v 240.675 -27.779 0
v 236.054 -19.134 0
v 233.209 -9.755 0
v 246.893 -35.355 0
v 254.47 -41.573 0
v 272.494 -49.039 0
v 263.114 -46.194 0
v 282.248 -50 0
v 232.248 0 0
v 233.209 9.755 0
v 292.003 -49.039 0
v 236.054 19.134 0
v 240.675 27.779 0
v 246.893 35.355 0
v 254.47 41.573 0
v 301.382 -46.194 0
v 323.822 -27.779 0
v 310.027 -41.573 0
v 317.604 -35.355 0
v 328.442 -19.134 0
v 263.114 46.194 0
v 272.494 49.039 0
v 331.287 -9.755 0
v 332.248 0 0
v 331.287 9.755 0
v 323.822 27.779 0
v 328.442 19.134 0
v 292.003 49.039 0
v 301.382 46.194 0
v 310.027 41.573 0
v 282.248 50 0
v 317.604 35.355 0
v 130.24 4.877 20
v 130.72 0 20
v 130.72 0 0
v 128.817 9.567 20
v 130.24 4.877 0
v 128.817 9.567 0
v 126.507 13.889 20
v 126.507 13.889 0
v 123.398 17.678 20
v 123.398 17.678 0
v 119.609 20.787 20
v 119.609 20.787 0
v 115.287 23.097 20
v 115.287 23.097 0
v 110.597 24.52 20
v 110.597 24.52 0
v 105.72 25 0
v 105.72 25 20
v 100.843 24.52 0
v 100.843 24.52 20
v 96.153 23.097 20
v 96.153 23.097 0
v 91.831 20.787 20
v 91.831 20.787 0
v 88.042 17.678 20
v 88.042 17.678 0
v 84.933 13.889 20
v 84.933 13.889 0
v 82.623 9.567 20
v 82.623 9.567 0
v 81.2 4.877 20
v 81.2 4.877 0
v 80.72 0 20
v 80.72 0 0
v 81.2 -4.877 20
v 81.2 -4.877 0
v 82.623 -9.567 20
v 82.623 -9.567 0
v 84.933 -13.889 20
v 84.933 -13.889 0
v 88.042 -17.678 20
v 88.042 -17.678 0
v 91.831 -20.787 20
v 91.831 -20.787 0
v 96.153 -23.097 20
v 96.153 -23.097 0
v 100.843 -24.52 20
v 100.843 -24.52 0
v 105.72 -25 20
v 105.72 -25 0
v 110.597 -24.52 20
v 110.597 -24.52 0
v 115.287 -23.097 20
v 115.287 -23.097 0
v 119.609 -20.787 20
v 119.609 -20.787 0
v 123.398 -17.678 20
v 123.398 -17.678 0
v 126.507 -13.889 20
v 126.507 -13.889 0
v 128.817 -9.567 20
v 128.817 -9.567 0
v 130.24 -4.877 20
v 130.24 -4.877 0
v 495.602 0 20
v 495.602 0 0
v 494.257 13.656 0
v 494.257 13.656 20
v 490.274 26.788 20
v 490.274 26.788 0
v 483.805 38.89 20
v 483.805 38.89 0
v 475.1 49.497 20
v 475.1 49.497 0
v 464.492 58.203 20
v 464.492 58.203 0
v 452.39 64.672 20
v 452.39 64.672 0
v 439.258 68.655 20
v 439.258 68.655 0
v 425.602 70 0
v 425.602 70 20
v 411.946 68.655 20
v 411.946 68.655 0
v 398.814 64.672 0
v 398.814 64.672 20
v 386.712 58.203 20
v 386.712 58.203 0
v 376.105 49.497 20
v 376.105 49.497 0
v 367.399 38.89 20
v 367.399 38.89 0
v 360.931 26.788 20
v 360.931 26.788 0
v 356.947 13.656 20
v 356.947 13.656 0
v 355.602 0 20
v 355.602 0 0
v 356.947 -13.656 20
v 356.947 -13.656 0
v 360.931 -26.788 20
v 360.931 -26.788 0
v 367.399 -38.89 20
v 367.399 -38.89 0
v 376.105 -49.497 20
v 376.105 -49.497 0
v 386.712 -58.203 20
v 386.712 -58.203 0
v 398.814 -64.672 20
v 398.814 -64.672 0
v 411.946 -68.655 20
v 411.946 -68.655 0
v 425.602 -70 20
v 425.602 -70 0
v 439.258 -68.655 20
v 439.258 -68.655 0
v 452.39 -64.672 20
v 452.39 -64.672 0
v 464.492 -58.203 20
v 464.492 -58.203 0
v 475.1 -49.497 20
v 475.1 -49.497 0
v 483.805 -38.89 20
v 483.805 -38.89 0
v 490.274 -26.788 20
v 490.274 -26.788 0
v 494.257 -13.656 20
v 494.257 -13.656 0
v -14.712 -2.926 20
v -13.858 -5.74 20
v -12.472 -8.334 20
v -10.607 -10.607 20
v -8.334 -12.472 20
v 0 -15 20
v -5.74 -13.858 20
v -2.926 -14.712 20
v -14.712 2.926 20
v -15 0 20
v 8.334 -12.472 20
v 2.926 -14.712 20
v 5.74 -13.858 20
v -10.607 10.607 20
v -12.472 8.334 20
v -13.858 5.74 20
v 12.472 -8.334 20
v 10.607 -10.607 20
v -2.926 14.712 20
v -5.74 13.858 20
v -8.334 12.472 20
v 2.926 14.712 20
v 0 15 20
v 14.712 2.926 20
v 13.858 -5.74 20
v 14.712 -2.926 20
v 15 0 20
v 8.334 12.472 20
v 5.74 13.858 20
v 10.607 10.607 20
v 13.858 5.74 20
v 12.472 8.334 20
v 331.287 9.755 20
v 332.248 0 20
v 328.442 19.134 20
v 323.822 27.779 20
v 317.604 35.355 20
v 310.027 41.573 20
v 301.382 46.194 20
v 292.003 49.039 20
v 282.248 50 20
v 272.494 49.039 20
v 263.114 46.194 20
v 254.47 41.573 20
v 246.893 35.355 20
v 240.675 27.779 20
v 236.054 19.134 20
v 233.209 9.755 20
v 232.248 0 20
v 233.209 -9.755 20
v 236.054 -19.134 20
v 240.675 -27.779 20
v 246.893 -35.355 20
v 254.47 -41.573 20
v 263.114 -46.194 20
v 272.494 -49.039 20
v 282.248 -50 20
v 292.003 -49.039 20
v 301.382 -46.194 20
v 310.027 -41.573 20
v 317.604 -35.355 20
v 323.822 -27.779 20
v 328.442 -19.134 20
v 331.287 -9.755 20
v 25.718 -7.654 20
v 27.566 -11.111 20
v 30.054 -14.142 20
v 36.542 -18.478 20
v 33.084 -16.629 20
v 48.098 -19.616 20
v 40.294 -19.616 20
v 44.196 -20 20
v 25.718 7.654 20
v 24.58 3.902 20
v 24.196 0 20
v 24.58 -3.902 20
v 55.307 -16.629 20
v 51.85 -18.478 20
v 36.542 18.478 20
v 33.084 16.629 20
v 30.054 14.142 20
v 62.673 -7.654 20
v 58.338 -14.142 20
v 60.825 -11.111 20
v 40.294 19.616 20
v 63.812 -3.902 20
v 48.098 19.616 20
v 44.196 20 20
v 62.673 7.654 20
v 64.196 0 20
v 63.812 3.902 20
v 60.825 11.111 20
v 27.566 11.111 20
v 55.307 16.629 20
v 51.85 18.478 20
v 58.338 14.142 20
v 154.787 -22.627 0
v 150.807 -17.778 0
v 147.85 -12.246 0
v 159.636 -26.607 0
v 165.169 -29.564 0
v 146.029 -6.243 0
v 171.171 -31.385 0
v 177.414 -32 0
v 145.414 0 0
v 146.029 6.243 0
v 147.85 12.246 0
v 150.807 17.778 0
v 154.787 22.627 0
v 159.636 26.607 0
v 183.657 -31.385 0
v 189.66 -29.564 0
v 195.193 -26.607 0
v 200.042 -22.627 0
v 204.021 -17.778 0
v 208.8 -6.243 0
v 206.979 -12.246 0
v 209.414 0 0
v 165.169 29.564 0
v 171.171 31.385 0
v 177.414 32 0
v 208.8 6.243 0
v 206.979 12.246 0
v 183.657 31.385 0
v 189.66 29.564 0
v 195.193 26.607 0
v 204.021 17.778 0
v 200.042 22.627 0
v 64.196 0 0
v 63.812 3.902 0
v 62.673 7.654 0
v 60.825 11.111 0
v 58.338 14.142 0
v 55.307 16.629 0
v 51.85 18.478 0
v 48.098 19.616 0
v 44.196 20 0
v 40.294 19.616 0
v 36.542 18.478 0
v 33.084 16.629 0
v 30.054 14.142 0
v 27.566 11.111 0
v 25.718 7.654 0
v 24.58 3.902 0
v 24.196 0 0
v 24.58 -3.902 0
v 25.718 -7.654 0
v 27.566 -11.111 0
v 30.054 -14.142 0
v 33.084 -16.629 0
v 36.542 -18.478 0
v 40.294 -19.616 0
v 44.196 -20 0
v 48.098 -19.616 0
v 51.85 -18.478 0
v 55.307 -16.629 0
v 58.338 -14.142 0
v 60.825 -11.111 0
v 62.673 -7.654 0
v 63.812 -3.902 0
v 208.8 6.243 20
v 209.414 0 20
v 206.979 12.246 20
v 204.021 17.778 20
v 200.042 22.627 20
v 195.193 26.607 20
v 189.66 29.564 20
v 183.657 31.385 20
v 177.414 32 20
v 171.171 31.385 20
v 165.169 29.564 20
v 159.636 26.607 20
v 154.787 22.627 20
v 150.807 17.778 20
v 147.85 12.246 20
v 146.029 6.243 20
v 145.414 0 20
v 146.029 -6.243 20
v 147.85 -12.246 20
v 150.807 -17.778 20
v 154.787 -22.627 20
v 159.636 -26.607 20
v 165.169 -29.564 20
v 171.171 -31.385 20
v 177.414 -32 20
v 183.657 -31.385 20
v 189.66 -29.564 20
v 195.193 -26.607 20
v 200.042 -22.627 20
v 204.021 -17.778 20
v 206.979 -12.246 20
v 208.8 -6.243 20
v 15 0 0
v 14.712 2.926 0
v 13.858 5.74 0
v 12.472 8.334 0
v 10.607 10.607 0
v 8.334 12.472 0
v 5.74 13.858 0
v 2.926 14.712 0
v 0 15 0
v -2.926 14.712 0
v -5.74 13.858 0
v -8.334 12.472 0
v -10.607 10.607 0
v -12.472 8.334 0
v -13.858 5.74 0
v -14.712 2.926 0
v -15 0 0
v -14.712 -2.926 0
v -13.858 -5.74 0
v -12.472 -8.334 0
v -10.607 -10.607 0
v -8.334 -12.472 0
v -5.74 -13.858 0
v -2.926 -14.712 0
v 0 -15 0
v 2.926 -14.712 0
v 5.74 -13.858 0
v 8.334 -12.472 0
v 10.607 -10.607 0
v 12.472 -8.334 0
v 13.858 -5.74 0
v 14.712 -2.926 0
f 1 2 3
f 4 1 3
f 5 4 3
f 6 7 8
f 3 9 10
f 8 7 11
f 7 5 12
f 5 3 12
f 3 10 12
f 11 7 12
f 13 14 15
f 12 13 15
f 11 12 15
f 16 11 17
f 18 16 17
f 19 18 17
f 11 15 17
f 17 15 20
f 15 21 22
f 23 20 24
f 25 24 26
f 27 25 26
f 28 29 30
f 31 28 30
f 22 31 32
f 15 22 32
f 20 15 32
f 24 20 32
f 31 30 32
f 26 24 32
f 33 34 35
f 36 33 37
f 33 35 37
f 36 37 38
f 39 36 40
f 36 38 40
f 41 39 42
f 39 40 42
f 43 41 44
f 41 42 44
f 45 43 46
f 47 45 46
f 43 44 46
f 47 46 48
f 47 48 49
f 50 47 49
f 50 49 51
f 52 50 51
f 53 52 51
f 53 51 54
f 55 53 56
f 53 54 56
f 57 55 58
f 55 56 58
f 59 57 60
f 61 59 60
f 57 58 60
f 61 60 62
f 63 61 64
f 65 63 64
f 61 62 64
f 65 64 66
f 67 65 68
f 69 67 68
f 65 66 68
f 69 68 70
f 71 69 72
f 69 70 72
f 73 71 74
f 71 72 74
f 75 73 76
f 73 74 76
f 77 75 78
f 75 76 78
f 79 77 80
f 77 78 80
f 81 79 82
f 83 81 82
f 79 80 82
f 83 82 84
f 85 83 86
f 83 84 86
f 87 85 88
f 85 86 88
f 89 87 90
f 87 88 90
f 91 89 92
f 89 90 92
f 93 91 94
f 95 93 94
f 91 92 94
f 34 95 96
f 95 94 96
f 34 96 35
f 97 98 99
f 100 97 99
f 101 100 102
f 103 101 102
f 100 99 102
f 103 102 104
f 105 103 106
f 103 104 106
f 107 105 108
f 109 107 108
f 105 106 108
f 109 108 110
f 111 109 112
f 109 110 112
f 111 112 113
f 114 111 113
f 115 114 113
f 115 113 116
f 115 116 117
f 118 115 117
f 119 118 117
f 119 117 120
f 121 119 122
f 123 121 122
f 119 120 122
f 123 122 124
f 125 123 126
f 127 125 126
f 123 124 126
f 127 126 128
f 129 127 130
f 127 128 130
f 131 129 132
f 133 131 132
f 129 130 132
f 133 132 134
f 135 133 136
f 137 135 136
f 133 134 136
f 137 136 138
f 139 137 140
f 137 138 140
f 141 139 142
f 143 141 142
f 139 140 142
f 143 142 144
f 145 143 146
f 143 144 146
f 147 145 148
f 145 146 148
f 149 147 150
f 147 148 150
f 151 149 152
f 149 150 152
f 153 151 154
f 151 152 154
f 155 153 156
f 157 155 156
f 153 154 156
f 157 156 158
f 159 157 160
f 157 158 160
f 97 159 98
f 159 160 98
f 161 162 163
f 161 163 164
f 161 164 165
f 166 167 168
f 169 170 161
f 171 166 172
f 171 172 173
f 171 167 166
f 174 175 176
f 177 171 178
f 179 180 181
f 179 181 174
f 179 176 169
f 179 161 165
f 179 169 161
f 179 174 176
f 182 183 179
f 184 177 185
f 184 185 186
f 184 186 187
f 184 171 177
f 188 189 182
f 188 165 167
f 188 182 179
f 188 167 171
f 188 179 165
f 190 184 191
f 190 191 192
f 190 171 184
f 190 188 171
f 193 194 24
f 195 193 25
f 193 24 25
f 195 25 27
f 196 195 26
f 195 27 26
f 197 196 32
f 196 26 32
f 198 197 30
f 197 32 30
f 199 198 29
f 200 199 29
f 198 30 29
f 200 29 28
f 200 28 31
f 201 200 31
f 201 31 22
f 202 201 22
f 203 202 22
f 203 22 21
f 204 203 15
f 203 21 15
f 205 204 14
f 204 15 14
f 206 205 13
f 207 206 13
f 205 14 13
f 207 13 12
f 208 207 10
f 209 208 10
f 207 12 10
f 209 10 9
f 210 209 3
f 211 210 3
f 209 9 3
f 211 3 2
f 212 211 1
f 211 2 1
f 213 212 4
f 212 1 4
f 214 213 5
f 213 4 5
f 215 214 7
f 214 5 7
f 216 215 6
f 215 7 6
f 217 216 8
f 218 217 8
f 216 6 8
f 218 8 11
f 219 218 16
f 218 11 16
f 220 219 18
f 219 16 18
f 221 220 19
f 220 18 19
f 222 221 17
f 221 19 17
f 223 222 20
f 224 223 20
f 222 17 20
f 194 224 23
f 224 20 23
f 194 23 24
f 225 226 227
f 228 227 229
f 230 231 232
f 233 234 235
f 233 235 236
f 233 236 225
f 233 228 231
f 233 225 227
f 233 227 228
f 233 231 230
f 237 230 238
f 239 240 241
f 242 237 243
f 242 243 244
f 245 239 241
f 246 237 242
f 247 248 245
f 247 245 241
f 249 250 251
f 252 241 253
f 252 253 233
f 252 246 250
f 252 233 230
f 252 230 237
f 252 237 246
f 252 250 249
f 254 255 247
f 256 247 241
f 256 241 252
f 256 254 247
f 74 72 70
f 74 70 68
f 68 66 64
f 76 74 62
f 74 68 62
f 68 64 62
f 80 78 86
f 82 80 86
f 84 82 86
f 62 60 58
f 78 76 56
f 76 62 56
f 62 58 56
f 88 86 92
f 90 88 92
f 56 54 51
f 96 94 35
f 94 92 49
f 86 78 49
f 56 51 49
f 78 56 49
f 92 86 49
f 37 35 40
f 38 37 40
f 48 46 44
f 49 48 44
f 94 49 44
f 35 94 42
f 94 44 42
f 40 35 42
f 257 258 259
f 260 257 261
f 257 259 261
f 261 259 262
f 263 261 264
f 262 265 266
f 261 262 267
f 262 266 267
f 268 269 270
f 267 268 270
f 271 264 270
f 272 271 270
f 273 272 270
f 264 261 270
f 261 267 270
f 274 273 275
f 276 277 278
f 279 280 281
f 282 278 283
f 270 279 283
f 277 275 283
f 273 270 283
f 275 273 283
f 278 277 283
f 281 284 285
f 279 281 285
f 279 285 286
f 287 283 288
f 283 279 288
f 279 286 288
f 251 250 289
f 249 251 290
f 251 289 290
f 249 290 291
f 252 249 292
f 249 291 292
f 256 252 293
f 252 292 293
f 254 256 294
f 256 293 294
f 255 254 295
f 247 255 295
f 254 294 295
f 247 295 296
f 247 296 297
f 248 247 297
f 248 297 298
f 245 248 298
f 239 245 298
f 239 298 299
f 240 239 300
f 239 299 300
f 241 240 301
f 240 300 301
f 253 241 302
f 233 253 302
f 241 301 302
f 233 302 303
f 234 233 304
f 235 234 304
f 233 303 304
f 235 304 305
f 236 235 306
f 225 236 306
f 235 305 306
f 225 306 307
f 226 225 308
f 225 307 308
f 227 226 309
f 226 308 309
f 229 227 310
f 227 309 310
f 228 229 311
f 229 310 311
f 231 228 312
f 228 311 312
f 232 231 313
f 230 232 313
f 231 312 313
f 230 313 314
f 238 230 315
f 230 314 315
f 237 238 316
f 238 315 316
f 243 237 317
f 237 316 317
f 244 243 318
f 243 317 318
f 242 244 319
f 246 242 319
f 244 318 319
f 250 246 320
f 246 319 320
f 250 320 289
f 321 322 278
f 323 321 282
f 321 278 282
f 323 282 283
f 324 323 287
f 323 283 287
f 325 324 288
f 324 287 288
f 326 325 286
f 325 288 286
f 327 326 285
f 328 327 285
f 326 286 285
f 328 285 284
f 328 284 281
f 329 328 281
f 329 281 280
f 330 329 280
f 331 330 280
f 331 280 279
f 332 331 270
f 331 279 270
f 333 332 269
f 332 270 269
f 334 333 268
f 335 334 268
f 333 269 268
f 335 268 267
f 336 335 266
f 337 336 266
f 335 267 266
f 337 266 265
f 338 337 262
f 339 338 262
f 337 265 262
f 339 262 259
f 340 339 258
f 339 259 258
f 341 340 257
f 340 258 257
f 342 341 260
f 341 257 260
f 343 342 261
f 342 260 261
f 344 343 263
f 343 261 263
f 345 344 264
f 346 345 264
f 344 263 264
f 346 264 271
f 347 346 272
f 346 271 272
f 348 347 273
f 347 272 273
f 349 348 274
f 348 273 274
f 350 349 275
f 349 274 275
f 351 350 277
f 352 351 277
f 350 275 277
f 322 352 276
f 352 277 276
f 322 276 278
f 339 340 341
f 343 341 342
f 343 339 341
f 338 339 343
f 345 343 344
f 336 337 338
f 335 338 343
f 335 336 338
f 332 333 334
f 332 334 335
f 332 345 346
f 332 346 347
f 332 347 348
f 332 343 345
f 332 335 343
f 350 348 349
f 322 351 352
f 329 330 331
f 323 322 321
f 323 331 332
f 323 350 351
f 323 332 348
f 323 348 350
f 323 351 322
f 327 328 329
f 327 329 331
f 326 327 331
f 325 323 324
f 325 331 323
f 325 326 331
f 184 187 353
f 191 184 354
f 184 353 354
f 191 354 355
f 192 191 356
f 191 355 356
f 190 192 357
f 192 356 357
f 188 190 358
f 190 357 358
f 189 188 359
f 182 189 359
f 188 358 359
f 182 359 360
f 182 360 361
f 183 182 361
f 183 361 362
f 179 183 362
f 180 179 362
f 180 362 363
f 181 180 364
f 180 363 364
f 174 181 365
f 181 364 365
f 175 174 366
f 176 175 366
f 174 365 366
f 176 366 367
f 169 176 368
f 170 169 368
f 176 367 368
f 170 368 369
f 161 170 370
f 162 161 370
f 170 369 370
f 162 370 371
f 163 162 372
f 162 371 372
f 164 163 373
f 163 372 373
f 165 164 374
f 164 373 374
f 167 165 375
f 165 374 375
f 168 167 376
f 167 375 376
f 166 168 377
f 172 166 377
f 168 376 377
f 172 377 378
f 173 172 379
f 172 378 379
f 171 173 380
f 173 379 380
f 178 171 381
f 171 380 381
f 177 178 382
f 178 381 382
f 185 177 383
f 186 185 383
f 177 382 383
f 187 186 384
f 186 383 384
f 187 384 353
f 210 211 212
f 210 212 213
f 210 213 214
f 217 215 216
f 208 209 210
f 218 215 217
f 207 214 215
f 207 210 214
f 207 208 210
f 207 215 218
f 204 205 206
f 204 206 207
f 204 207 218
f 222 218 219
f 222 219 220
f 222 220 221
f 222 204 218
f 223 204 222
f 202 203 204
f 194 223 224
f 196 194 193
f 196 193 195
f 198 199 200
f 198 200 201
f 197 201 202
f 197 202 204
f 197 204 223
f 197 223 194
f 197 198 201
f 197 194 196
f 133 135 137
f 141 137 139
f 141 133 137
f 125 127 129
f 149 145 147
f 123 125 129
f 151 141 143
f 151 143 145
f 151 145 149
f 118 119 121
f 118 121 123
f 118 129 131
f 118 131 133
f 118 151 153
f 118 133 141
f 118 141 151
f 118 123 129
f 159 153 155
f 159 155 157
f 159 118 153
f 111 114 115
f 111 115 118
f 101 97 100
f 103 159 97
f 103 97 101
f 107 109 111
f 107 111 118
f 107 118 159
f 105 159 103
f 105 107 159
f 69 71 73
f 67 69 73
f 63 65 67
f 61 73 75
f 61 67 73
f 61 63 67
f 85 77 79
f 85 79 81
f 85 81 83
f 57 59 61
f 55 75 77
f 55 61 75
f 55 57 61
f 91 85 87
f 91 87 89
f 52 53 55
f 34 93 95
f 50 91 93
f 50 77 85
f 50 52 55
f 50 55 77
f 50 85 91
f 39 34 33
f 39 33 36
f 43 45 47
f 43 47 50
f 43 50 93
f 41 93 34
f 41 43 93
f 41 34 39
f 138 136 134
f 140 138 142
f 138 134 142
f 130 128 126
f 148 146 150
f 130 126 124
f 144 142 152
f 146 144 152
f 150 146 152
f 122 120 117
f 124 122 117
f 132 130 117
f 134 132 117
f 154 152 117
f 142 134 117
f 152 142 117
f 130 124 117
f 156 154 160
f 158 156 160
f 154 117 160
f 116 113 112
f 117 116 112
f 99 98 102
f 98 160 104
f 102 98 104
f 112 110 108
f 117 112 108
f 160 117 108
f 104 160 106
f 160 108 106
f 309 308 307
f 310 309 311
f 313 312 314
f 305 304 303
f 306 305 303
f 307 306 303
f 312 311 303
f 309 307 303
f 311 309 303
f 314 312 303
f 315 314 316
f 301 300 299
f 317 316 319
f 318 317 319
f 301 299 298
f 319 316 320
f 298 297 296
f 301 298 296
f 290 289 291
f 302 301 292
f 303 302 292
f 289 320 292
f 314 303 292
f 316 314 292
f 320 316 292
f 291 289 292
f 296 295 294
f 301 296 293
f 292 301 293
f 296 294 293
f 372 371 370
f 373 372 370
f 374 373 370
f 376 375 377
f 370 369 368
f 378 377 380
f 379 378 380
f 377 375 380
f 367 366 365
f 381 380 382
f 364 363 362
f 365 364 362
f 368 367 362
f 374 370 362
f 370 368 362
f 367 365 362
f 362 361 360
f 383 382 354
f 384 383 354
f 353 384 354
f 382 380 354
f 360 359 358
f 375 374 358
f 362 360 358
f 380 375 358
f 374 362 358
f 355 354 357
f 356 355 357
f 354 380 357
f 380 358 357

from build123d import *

# Parameters (mm, degrees)
F0_R      = 15
F1_DEPTH  = 20
F2_R      = 20
F3_DEPTH  = 20
F4_R      = 25
F5_DEPTH  = 20
F6_R      = 32
F7_DEPTH  = 20
F8_R      = 50
F9_DEPTH  = 20
F10_R     = 70
F11_DEPTH = 20


with BuildPart() as f1:
    # F0 (on Top) → F1 (new body)
    with BuildSketch(Plane.XY):
        Circle(F0_R)
    extrude(amount=F1_DEPTH)


with BuildPart() as f3:
    # F2 (on Top) → F3 (new body)
    with BuildSketch(Plane.XY):
        with Locations((44.195835, 0)):
            Circle(F2_R)
    extrude(amount=F3_DEPTH)


with BuildPart() as f5:
    # F4 (on Top) → F5 (new body)
    with BuildSketch(Plane.XY):
        with Locations((105.719917, 0)):
            Circle(F4_R)
    extrude(amount=F5_DEPTH)


with BuildPart() as f7:
    # F6 (on Top) → F7 (new body)
    with BuildSketch(Plane.XY):
        with Locations((177.414373, 0)):
            Circle(F6_R)
    extrude(amount=F7_DEPTH)


with BuildPart() as f9:
    # F8 (on Top) → F9 (new body)
    with BuildSketch(Plane.XY):
        with Locations((282.248229, 0)):
            Circle(F8_R)
    extrude(amount=F9_DEPTH)


with BuildPart() as f11:
    # F10 (on Top) → F11 (new body)
    with BuildSketch(Plane.XY):
        with Locations((425.602103, 0)):
            Circle(F10_R)
    extrude(amount=F11_DEPTH)


solid = Compound([f1.part, f3.part, f5.part, f7.part, f9.part, f11.part])
